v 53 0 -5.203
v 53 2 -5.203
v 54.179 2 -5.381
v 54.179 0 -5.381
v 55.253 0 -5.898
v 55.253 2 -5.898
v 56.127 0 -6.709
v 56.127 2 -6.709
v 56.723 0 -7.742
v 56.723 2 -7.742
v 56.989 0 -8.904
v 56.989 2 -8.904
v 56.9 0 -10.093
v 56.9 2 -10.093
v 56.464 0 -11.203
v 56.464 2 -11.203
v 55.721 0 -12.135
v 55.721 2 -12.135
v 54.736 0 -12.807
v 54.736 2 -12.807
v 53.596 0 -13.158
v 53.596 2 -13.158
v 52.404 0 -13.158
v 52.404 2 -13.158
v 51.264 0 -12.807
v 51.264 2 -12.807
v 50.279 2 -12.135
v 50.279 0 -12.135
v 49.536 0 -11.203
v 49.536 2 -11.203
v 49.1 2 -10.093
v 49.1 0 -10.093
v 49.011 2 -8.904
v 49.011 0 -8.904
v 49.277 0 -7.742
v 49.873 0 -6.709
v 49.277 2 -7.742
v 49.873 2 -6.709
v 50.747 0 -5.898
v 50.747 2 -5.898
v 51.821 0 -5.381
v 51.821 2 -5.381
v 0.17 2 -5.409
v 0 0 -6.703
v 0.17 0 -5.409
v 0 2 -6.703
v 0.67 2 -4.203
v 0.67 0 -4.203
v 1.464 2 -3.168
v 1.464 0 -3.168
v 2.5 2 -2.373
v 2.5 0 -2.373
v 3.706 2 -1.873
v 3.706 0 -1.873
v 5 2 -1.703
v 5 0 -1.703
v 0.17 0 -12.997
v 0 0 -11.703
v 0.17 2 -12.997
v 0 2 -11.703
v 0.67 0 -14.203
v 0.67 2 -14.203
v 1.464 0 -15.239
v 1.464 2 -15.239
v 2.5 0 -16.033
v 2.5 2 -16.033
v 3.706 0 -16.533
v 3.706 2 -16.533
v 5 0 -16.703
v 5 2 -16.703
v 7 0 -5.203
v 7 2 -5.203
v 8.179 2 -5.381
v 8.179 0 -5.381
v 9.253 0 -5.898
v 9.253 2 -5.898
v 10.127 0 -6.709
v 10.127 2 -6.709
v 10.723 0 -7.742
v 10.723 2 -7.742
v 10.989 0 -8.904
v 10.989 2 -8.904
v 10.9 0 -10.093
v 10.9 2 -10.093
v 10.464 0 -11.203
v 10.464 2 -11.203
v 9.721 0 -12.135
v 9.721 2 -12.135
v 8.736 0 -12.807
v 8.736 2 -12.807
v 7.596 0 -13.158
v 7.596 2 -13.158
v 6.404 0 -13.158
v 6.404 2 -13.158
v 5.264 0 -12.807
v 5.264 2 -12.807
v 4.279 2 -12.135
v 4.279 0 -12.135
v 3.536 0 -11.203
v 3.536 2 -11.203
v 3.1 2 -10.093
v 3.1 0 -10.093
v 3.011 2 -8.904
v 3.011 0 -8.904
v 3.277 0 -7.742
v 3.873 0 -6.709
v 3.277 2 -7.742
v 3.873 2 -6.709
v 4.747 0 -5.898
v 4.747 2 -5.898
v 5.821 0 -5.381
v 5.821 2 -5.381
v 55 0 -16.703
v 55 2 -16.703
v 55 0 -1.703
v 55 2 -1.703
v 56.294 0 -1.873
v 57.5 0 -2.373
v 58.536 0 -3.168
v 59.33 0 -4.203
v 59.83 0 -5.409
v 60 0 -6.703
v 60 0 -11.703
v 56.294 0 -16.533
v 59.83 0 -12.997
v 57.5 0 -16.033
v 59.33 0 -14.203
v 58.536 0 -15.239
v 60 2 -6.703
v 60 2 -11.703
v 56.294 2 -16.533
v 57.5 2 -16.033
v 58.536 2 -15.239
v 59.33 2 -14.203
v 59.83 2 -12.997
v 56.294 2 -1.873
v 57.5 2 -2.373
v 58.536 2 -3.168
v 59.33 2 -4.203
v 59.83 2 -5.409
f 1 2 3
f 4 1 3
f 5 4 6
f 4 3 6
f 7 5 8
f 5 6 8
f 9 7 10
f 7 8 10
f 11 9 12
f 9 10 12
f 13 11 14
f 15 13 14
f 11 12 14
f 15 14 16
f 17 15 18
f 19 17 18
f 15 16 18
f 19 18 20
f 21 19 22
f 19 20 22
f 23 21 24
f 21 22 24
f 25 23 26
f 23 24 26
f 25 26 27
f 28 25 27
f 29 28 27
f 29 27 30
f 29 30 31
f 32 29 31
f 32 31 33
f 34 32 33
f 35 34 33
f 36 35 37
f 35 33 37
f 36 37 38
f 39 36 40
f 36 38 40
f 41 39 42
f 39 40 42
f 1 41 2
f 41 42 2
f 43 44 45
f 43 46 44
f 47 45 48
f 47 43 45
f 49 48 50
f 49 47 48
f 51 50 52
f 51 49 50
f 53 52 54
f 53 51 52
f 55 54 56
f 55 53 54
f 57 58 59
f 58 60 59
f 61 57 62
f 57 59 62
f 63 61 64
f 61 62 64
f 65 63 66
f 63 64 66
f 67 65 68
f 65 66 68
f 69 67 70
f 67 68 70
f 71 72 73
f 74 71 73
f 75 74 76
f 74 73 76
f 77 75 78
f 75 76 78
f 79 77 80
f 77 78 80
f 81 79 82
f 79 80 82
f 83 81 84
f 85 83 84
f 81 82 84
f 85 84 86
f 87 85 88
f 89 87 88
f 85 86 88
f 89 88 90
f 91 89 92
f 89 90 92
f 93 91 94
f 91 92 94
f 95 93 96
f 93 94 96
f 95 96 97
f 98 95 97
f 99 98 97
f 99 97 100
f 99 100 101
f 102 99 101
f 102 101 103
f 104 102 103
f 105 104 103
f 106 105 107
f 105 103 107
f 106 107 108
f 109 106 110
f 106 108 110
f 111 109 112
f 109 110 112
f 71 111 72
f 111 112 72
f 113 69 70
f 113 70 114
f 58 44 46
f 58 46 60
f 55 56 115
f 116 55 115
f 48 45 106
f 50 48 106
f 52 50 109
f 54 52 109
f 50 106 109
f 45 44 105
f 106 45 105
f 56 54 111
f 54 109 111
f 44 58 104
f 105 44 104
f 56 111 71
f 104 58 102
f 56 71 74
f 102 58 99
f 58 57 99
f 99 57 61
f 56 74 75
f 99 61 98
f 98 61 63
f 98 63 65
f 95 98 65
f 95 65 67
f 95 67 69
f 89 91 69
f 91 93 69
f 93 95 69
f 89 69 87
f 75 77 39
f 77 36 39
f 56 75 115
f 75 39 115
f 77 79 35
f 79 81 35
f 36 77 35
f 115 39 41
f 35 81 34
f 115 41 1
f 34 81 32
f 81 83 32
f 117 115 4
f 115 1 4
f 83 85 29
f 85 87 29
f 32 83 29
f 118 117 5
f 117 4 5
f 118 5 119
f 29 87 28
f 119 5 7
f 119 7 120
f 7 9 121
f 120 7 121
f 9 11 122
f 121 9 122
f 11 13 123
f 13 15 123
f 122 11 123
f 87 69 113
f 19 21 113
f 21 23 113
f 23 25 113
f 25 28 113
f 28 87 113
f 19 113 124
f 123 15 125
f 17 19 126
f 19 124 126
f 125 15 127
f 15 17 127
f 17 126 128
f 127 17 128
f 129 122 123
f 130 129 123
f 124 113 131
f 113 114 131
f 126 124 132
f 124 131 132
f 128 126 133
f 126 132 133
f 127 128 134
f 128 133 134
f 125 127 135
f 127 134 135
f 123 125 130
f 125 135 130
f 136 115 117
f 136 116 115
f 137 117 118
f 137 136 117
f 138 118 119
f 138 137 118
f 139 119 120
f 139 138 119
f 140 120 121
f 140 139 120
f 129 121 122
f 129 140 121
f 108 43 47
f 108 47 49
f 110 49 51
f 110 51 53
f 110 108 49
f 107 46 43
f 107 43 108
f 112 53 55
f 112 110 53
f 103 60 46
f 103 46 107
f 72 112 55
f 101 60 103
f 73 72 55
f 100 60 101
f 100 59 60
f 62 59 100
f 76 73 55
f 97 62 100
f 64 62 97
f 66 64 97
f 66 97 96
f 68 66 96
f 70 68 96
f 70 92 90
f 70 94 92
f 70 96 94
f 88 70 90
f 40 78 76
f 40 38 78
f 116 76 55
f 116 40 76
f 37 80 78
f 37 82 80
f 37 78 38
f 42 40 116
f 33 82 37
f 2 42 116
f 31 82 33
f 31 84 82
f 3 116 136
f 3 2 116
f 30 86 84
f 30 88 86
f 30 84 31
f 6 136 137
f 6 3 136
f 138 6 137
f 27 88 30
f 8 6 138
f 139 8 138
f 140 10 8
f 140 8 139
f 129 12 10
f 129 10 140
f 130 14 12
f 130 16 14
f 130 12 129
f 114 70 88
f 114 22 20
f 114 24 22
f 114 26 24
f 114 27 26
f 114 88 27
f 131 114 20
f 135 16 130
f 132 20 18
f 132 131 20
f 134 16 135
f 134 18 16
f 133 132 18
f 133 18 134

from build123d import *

# Parameters (mm, degrees)
SKETCH1_W           = 60
SKETCH1_H           = 15
BOSS_EXTRUDE1_DEPTH = 2
SKETCH2_R           = 4
CUT_EXTRUDE1_DEPTH  = 2
FILLET2_R           = 5


with BuildPart() as part:
    # Sketch1 → Boss-Extrude1 (new body)
    with BuildSketch(Plane(origin=(0, 0, 0), x_dir=(1, 0, 0), z_dir=(0, 1, 0))):
        with Locations((30, 9.203056769)):
            Rectangle(SKETCH1_W, SKETCH1_H)
    extrude(amount=BOSS_EXTRUDE1_DEPTH)

    # Sketch2 → Cut-Extrude1 (cut)
    with BuildSketch(Plane(origin=(0, 2, 0), x_dir=(1, 0, 0), z_dir=(0, 1, 0))):
        with Locations(Location((7, 9.203056769, 0), (0, 0, 270))):
            Circle(SKETCH2_R)
        with Locations(Location((53, 9.203056769, 0), (0, 0, 270))):
            Circle(SKETCH2_R)
    extrude(amount=-CUT_EXTRUDE1_DEPTH, mode=Mode.SUBTRACT)

    # Fillet2
    fillet2_edges = [part.edges().sort_by_distance(p)[0] for p in [
        (0, 1, -16.703056769),
        (60, 1, -16.703056769),
        (60, 1, -1.703056769),
        (0, 1, -1.703056769),
    ]]
    fillet(fillet2_edges, radius=FILLET2_R)


solid = part.part
